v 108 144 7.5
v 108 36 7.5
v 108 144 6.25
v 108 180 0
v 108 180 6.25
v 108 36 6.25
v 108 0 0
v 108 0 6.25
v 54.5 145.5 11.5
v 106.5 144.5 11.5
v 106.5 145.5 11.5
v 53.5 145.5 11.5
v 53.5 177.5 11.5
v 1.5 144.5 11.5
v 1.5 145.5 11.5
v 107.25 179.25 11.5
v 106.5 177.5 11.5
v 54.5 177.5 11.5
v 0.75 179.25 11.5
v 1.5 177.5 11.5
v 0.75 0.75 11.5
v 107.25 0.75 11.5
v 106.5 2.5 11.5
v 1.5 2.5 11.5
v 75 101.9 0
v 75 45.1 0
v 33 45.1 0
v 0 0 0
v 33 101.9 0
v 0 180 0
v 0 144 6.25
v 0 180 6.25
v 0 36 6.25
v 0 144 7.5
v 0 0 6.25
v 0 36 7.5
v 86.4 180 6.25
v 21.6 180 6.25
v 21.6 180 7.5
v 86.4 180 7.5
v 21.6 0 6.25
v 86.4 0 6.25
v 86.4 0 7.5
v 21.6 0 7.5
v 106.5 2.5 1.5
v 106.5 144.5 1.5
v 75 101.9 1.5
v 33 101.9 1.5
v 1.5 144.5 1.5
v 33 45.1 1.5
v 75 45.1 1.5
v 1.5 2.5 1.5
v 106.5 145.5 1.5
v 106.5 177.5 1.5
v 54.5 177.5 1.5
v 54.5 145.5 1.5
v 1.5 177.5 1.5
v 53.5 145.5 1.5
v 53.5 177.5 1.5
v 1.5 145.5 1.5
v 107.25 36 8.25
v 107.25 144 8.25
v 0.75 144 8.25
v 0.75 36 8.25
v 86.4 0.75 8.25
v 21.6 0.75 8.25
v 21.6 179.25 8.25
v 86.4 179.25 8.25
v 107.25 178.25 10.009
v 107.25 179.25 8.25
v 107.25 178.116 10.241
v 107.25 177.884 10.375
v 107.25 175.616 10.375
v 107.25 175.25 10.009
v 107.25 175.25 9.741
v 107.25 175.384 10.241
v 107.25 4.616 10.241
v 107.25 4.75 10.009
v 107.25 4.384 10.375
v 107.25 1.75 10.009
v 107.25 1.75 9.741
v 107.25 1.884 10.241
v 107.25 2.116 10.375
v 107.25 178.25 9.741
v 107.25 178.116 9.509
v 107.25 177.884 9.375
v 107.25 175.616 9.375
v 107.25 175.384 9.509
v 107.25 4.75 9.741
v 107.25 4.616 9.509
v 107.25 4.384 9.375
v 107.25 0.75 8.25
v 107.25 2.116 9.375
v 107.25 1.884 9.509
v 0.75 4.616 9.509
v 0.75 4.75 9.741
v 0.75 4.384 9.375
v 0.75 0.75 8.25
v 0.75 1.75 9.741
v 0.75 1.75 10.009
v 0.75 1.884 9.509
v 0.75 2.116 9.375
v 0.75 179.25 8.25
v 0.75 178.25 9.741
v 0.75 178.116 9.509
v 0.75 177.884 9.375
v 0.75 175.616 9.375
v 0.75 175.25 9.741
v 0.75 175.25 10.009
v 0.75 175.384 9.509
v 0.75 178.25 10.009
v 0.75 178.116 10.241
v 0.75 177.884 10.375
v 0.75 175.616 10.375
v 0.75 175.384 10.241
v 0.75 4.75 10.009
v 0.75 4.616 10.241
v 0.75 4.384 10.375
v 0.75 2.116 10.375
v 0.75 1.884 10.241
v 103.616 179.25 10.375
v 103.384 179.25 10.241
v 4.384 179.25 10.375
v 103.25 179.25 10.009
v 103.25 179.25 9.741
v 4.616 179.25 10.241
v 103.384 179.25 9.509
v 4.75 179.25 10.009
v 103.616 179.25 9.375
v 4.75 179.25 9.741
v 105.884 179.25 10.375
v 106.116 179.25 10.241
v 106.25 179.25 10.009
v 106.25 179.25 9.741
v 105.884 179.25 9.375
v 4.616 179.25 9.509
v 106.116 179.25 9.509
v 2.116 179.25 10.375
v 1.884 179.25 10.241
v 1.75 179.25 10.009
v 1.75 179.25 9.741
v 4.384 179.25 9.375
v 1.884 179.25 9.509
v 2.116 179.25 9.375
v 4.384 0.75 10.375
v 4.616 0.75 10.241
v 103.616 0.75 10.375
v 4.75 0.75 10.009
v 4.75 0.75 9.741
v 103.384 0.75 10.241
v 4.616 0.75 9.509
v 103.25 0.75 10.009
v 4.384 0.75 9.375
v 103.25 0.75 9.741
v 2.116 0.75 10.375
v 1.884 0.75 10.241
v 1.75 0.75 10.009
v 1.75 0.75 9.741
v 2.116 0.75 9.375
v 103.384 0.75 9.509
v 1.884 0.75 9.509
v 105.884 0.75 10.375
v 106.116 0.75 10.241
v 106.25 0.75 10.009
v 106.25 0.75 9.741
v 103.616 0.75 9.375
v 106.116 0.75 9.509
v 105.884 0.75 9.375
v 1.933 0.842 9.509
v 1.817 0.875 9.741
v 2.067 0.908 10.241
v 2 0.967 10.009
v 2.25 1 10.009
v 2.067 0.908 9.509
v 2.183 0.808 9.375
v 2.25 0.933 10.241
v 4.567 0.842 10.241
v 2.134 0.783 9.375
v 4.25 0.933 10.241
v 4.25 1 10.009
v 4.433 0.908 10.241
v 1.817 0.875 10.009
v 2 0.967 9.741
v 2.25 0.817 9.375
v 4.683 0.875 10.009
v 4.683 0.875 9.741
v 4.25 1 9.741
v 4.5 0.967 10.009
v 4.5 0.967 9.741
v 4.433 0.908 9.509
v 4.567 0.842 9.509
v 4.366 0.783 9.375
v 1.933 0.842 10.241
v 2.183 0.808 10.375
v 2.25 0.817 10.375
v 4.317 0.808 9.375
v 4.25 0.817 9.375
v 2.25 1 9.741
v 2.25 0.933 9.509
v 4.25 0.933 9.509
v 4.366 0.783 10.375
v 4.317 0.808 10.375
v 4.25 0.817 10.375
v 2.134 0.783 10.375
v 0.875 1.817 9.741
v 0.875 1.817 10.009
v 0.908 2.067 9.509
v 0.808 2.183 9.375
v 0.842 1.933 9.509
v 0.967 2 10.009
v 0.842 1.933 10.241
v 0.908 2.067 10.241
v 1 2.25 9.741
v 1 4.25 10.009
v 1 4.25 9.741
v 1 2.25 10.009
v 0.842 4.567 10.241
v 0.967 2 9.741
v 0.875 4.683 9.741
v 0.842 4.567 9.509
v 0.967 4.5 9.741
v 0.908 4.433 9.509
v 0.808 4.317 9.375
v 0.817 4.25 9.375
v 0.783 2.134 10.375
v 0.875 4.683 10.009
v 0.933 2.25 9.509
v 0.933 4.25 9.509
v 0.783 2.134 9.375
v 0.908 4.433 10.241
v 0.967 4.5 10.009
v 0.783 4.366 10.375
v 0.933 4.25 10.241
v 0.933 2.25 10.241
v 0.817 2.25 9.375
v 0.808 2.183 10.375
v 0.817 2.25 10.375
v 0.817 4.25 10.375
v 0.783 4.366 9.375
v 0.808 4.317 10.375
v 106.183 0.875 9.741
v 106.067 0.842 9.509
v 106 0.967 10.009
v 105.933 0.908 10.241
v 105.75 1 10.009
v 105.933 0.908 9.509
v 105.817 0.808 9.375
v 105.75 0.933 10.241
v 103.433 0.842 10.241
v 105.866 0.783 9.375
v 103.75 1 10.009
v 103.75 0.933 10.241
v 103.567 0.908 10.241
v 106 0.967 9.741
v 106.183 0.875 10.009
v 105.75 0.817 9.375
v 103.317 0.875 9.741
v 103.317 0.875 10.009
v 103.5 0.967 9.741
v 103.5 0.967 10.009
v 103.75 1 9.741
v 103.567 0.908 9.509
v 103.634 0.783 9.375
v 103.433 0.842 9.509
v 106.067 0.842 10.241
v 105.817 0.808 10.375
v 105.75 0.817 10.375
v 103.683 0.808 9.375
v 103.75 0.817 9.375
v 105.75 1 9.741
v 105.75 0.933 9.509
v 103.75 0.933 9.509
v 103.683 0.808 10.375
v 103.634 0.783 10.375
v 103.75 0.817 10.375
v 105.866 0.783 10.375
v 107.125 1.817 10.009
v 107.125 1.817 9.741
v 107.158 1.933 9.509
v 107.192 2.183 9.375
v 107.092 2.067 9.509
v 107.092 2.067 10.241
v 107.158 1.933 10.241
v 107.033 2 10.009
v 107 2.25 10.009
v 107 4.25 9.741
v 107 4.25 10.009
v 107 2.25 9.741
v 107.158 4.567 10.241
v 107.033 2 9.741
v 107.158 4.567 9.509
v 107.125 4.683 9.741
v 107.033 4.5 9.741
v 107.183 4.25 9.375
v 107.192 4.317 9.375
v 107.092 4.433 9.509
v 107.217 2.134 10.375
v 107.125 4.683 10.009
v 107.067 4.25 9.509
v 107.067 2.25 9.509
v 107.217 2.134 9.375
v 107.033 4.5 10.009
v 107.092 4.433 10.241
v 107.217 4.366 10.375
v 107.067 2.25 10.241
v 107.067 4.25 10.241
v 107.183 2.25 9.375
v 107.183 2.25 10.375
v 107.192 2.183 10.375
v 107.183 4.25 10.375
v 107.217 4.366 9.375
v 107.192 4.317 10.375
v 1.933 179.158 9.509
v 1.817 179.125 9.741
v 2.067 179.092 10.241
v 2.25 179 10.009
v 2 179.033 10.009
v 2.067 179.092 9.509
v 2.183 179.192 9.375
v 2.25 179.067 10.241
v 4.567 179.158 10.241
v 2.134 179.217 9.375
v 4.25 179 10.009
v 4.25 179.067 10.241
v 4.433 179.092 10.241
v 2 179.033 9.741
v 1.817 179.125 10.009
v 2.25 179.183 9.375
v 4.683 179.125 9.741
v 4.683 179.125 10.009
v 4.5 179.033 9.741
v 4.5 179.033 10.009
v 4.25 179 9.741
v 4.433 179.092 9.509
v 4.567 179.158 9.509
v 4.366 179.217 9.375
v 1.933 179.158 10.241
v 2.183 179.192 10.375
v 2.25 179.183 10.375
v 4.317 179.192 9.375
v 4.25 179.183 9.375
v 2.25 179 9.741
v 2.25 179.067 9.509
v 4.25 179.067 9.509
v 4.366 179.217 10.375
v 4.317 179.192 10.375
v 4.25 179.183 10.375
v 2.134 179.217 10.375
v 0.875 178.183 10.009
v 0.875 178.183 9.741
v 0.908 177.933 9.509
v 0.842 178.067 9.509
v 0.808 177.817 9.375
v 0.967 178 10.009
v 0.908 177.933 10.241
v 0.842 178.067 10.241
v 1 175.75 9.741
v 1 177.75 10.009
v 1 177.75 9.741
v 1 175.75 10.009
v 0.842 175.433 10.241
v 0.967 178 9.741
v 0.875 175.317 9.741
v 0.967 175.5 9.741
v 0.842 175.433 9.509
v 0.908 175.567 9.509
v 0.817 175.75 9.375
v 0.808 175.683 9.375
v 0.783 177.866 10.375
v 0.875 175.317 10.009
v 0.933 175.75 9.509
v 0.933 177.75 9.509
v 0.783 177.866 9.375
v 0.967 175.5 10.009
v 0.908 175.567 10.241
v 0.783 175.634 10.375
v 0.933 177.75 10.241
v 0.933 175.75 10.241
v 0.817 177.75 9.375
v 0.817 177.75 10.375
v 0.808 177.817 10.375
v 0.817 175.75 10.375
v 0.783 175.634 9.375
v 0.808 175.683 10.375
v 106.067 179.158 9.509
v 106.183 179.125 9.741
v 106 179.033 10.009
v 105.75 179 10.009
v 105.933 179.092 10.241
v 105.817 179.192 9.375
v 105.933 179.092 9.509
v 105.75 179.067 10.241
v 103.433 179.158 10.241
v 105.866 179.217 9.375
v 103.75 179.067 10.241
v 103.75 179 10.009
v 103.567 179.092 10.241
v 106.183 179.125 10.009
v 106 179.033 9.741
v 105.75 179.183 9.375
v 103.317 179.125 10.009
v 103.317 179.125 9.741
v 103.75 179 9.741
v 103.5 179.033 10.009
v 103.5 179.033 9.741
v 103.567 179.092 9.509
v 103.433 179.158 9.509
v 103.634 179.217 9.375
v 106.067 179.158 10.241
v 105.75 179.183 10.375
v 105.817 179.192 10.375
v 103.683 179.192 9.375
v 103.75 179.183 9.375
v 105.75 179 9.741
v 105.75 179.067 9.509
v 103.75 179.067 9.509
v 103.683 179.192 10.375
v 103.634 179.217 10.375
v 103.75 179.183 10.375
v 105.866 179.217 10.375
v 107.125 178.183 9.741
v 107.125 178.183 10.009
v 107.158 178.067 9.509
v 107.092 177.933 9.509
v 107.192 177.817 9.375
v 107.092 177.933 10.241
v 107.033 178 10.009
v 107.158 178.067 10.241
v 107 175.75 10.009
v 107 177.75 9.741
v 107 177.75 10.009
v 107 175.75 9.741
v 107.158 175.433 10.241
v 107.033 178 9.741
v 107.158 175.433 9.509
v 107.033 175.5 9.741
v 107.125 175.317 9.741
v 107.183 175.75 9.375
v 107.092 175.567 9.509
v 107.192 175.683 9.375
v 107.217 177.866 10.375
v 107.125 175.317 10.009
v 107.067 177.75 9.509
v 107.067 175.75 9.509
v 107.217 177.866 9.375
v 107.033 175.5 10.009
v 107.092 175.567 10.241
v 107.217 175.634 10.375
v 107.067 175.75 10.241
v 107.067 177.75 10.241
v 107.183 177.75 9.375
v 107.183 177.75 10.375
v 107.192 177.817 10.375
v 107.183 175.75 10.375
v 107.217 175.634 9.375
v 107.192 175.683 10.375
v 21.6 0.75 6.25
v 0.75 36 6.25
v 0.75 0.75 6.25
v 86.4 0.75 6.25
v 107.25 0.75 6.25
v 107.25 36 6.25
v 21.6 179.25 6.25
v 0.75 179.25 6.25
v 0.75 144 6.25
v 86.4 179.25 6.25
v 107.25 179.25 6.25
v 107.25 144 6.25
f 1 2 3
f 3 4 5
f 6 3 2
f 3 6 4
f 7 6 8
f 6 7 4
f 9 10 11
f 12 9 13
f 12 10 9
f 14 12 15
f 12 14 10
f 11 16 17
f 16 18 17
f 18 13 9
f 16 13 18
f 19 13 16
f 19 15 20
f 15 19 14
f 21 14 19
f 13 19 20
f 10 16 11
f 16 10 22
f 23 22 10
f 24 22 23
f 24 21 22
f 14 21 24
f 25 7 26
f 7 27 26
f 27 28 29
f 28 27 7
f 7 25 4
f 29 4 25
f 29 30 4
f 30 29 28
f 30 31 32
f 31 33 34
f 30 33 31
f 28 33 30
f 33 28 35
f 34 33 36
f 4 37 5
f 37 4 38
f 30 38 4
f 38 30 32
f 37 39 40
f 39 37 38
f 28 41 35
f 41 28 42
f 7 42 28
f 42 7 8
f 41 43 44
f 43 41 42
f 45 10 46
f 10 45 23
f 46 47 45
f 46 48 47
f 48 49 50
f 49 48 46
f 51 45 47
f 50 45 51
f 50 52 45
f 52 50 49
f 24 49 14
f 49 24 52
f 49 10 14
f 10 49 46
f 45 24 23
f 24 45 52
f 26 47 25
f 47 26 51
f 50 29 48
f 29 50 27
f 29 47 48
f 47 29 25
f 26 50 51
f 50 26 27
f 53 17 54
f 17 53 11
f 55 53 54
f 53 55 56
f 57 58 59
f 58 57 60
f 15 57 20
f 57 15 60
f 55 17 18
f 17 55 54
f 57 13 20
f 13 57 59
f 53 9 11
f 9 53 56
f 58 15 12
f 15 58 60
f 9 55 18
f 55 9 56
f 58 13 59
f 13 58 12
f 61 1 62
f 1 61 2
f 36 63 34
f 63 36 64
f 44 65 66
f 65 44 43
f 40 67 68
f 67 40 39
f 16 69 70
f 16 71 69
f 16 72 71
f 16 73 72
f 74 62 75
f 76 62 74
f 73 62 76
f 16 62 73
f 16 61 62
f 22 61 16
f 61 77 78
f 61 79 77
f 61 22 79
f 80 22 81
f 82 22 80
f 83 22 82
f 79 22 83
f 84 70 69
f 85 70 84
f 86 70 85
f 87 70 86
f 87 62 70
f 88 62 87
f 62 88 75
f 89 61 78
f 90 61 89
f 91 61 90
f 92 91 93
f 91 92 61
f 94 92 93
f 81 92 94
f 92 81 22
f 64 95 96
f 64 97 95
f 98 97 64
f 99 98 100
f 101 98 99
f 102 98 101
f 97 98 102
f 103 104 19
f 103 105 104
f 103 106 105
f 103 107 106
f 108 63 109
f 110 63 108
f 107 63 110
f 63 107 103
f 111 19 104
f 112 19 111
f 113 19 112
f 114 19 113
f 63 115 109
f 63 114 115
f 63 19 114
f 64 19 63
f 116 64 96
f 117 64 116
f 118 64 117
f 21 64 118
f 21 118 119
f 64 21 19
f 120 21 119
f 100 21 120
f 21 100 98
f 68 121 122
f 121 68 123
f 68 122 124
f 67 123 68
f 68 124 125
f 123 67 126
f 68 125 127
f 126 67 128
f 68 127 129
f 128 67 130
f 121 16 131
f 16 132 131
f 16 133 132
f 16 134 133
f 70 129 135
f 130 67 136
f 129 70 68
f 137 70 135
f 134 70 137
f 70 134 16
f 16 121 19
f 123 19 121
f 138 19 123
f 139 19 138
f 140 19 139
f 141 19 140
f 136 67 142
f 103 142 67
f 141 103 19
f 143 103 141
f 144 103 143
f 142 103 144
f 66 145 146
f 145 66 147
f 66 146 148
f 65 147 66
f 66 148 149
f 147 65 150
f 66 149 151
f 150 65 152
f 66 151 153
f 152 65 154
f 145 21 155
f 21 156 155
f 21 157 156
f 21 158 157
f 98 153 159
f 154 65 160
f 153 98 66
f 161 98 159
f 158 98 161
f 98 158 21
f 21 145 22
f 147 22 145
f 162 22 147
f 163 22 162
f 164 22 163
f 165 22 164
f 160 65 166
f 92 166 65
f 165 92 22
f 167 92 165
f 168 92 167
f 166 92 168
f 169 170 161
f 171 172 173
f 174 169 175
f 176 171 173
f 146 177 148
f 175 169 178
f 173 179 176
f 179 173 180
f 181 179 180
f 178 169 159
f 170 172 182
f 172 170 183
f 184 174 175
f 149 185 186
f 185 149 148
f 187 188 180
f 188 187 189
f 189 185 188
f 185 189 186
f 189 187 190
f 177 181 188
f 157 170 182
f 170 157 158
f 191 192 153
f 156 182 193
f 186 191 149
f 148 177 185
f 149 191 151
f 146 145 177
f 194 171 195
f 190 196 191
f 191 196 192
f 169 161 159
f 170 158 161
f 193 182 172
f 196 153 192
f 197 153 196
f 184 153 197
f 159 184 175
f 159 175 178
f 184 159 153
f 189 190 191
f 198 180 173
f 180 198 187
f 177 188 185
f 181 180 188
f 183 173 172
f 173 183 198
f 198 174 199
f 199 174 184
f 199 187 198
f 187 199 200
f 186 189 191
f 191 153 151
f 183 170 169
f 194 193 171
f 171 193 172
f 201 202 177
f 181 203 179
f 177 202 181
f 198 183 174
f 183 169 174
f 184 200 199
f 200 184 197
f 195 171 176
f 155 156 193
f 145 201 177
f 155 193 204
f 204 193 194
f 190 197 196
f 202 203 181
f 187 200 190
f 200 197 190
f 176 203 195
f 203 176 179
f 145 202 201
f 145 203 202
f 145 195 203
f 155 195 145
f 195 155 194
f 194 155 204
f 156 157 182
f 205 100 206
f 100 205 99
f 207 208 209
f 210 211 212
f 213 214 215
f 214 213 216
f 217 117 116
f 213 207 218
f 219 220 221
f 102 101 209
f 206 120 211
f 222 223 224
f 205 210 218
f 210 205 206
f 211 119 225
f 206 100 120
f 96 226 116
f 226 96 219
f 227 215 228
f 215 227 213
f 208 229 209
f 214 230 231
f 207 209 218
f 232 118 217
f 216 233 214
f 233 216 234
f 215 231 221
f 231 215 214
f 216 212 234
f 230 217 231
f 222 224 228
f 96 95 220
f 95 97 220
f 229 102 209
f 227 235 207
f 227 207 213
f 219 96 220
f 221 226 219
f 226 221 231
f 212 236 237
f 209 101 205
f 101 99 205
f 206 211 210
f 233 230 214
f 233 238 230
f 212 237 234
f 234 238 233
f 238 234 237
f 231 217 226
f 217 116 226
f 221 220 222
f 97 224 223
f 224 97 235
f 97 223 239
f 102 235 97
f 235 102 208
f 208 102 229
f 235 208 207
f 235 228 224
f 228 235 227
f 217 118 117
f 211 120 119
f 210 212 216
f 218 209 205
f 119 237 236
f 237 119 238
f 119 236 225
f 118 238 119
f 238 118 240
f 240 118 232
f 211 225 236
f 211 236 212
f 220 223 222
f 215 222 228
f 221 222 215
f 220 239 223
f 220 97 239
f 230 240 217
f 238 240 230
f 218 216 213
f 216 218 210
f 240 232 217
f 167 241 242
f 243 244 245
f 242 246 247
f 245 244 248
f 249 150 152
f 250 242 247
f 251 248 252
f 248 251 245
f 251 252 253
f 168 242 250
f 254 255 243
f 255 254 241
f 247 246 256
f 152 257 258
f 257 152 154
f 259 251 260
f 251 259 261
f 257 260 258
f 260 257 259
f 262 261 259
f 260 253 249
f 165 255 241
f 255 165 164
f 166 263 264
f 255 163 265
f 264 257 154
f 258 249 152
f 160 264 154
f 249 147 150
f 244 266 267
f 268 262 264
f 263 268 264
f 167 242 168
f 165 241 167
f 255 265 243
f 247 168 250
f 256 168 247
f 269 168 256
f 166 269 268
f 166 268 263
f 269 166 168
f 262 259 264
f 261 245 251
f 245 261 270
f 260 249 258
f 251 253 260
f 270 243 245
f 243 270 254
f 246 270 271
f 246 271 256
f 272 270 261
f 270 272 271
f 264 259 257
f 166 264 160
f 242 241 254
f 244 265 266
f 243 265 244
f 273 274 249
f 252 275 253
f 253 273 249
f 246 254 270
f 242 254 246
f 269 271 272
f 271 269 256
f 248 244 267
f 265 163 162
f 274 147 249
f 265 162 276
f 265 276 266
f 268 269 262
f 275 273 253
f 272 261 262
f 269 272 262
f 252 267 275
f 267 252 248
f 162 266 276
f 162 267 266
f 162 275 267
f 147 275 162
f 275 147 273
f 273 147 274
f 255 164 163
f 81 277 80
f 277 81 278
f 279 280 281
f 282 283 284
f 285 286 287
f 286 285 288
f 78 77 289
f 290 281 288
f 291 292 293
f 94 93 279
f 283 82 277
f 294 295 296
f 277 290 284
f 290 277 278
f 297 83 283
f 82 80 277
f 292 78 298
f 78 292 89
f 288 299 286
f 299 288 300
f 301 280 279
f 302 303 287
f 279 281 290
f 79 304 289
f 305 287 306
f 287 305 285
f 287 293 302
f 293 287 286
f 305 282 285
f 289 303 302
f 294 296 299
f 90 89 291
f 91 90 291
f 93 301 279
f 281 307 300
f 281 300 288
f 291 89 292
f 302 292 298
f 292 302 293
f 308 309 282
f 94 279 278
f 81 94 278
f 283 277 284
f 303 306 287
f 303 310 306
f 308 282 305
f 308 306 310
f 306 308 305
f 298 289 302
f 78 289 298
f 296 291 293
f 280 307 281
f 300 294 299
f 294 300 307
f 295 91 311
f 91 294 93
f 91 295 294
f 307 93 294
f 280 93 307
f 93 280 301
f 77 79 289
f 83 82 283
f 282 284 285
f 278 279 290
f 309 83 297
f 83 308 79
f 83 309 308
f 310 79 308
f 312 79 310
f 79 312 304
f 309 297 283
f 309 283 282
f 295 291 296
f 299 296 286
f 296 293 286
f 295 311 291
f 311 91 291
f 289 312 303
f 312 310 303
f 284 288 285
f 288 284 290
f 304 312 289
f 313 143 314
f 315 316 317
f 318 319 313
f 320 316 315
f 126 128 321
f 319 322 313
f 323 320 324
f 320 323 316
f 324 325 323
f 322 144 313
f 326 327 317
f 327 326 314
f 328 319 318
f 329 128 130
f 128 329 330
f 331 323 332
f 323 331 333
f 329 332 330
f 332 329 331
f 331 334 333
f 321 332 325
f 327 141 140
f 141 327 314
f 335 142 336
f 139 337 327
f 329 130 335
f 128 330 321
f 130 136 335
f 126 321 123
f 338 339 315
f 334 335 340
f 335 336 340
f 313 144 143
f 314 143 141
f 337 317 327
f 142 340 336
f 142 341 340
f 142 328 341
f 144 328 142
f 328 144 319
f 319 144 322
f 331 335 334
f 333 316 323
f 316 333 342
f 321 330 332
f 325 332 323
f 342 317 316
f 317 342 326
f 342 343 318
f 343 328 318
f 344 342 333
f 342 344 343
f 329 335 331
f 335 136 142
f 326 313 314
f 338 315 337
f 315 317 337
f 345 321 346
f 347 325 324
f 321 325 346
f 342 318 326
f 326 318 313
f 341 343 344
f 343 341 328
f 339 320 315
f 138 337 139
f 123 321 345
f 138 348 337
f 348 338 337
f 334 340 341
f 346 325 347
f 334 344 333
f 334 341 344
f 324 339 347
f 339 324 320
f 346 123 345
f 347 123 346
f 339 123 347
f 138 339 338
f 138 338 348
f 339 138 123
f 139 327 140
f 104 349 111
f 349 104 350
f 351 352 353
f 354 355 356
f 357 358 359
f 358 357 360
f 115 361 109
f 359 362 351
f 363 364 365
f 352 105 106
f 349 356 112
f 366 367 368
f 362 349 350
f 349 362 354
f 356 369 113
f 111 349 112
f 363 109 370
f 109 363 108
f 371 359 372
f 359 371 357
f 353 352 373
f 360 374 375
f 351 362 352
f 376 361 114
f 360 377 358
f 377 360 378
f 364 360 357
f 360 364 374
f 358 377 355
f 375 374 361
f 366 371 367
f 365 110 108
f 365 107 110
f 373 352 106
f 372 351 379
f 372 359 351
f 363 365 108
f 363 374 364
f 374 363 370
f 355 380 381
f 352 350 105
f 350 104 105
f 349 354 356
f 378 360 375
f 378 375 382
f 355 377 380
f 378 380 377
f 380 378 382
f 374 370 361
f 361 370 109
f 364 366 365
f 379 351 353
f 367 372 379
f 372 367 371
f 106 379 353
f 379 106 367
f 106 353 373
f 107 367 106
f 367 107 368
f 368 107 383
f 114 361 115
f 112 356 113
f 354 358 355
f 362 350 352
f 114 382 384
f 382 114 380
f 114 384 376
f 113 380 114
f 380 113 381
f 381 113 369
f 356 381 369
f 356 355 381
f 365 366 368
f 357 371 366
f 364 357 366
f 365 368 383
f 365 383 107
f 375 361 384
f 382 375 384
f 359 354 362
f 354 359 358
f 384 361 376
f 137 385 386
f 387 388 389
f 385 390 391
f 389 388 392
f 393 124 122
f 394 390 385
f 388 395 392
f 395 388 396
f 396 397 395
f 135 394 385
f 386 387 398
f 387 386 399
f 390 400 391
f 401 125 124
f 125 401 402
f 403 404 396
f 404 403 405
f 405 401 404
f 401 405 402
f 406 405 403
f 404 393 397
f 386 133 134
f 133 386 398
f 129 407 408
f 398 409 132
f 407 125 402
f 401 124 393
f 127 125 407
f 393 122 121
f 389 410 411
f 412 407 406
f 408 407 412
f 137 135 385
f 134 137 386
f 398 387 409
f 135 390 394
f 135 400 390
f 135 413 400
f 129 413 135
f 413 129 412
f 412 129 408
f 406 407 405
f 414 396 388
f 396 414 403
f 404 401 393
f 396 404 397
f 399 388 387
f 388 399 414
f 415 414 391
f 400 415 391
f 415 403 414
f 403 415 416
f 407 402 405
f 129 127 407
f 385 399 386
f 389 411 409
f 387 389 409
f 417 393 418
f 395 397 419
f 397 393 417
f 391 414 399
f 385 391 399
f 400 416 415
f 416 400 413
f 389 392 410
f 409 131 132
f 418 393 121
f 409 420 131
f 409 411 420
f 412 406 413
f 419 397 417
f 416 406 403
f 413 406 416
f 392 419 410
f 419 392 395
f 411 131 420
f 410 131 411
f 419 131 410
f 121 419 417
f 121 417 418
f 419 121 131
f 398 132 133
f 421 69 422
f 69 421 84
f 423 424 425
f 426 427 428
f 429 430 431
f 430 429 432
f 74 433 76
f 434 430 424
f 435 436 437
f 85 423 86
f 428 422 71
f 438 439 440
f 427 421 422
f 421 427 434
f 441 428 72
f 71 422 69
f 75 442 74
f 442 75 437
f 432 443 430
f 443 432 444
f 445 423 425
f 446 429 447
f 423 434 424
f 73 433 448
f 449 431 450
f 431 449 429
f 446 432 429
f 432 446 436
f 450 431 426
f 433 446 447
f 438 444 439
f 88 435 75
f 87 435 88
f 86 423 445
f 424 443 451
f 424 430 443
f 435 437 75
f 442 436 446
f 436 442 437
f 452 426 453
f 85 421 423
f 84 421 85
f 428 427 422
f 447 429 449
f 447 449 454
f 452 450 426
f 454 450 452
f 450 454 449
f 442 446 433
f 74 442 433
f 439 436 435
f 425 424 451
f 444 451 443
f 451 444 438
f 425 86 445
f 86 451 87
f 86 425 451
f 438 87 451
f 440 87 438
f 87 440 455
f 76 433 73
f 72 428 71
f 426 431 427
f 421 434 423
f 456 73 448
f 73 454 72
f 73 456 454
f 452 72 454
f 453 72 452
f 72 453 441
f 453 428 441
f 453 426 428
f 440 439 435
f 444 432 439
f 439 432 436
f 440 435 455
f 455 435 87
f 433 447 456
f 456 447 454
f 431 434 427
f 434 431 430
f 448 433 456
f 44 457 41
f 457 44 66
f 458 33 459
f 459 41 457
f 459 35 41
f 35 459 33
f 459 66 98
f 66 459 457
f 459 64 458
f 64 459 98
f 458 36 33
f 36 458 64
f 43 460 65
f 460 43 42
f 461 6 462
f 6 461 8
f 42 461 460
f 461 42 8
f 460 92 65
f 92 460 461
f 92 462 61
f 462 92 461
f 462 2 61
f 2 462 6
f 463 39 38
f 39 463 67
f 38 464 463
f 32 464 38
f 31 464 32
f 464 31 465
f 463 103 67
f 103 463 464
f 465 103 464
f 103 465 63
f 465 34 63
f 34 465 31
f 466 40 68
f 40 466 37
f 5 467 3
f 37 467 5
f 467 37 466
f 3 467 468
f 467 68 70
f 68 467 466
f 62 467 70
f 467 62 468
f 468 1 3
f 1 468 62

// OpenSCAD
include <boardgame_insert_toolkit_lib.bill.scad>;

// determines whether lids are output.
g_b_print_lid = f;

// determines whether boxes are output.
g_b_print_box = t; 

// Focus on one box
g_isolated_print_box = ""; 

g_wall_thickness = 1.5;

function makeCrew( name ) = 
    [   name,
        [
            [ BOX_SIZE_XYZ,                 [108, 180, 11.5] ],    
            [ BOX_LID,
                [
                    [ LID_PATTERN_RADIUS,6],        
                    [ LID_INSET_B, f ],
                    [ LID_TABS_4B, [ t,t,t,t]],
                    [ LID_FIT_UNDER_B, f],
                    [ LID_LABELS_INVERT_B, t],
                    [ LABEL,
                        [
                            [ LBL_TEXT,     name ],
                            [ LBL_SIZE,     12 ],
                            [ ROTATION,     90 ],
                            [ LBL_FONT,     "Centaur:style=Regular"],
                        ]
                    ],
                ],
            ],
                         
            // troops
            [ BOX_COMPONENT,
                [
                    [CMP_COMPARTMENT_SIZE_XYZ,[ 105, 142, 10.5] ],
                    [CMP_NUM_COMPARTMENTS_XY,[1,1] ], 
                    [POSITION_XY,[CENTER, 1.0 ] ],   
                    [CMP_CUTOUT_BOTTOM_B,t],
                    [CMP_CUTOUT_BOTTOM_PCT,0.4],
                ]
            ],

            // cards 
            [ BOX_COMPONENT,
                [
                    [CMP_NUM_COMPARTMENTS_XY,   [2,1]],
                    [CMP_COMPARTMENT_SIZE_XYZ,  [ 52, 32, 19] ],
                    [POSITION_XY, [CENTER, 144]],
                ]
            ],
                     
        ]
    ];

//////////////////

data =
[
    //makeCrew( "Marco Reyes" ),
    //makeCrew( "Rafael Vieira" ),
    //makeCrew("'Mac' Mara Johnson"),
    //makeCrew("Gregory Little"),
    //makeCrew("Laurent Lapointe"),
    //makeCrew("Kannan Sharma"),
    //makeCrew("Kasumi Aoshima"),
    //makeCrew("Audrie Williams"),
    makeCrew("Cpt. Sofi Odessa")
];


MakeAll();
